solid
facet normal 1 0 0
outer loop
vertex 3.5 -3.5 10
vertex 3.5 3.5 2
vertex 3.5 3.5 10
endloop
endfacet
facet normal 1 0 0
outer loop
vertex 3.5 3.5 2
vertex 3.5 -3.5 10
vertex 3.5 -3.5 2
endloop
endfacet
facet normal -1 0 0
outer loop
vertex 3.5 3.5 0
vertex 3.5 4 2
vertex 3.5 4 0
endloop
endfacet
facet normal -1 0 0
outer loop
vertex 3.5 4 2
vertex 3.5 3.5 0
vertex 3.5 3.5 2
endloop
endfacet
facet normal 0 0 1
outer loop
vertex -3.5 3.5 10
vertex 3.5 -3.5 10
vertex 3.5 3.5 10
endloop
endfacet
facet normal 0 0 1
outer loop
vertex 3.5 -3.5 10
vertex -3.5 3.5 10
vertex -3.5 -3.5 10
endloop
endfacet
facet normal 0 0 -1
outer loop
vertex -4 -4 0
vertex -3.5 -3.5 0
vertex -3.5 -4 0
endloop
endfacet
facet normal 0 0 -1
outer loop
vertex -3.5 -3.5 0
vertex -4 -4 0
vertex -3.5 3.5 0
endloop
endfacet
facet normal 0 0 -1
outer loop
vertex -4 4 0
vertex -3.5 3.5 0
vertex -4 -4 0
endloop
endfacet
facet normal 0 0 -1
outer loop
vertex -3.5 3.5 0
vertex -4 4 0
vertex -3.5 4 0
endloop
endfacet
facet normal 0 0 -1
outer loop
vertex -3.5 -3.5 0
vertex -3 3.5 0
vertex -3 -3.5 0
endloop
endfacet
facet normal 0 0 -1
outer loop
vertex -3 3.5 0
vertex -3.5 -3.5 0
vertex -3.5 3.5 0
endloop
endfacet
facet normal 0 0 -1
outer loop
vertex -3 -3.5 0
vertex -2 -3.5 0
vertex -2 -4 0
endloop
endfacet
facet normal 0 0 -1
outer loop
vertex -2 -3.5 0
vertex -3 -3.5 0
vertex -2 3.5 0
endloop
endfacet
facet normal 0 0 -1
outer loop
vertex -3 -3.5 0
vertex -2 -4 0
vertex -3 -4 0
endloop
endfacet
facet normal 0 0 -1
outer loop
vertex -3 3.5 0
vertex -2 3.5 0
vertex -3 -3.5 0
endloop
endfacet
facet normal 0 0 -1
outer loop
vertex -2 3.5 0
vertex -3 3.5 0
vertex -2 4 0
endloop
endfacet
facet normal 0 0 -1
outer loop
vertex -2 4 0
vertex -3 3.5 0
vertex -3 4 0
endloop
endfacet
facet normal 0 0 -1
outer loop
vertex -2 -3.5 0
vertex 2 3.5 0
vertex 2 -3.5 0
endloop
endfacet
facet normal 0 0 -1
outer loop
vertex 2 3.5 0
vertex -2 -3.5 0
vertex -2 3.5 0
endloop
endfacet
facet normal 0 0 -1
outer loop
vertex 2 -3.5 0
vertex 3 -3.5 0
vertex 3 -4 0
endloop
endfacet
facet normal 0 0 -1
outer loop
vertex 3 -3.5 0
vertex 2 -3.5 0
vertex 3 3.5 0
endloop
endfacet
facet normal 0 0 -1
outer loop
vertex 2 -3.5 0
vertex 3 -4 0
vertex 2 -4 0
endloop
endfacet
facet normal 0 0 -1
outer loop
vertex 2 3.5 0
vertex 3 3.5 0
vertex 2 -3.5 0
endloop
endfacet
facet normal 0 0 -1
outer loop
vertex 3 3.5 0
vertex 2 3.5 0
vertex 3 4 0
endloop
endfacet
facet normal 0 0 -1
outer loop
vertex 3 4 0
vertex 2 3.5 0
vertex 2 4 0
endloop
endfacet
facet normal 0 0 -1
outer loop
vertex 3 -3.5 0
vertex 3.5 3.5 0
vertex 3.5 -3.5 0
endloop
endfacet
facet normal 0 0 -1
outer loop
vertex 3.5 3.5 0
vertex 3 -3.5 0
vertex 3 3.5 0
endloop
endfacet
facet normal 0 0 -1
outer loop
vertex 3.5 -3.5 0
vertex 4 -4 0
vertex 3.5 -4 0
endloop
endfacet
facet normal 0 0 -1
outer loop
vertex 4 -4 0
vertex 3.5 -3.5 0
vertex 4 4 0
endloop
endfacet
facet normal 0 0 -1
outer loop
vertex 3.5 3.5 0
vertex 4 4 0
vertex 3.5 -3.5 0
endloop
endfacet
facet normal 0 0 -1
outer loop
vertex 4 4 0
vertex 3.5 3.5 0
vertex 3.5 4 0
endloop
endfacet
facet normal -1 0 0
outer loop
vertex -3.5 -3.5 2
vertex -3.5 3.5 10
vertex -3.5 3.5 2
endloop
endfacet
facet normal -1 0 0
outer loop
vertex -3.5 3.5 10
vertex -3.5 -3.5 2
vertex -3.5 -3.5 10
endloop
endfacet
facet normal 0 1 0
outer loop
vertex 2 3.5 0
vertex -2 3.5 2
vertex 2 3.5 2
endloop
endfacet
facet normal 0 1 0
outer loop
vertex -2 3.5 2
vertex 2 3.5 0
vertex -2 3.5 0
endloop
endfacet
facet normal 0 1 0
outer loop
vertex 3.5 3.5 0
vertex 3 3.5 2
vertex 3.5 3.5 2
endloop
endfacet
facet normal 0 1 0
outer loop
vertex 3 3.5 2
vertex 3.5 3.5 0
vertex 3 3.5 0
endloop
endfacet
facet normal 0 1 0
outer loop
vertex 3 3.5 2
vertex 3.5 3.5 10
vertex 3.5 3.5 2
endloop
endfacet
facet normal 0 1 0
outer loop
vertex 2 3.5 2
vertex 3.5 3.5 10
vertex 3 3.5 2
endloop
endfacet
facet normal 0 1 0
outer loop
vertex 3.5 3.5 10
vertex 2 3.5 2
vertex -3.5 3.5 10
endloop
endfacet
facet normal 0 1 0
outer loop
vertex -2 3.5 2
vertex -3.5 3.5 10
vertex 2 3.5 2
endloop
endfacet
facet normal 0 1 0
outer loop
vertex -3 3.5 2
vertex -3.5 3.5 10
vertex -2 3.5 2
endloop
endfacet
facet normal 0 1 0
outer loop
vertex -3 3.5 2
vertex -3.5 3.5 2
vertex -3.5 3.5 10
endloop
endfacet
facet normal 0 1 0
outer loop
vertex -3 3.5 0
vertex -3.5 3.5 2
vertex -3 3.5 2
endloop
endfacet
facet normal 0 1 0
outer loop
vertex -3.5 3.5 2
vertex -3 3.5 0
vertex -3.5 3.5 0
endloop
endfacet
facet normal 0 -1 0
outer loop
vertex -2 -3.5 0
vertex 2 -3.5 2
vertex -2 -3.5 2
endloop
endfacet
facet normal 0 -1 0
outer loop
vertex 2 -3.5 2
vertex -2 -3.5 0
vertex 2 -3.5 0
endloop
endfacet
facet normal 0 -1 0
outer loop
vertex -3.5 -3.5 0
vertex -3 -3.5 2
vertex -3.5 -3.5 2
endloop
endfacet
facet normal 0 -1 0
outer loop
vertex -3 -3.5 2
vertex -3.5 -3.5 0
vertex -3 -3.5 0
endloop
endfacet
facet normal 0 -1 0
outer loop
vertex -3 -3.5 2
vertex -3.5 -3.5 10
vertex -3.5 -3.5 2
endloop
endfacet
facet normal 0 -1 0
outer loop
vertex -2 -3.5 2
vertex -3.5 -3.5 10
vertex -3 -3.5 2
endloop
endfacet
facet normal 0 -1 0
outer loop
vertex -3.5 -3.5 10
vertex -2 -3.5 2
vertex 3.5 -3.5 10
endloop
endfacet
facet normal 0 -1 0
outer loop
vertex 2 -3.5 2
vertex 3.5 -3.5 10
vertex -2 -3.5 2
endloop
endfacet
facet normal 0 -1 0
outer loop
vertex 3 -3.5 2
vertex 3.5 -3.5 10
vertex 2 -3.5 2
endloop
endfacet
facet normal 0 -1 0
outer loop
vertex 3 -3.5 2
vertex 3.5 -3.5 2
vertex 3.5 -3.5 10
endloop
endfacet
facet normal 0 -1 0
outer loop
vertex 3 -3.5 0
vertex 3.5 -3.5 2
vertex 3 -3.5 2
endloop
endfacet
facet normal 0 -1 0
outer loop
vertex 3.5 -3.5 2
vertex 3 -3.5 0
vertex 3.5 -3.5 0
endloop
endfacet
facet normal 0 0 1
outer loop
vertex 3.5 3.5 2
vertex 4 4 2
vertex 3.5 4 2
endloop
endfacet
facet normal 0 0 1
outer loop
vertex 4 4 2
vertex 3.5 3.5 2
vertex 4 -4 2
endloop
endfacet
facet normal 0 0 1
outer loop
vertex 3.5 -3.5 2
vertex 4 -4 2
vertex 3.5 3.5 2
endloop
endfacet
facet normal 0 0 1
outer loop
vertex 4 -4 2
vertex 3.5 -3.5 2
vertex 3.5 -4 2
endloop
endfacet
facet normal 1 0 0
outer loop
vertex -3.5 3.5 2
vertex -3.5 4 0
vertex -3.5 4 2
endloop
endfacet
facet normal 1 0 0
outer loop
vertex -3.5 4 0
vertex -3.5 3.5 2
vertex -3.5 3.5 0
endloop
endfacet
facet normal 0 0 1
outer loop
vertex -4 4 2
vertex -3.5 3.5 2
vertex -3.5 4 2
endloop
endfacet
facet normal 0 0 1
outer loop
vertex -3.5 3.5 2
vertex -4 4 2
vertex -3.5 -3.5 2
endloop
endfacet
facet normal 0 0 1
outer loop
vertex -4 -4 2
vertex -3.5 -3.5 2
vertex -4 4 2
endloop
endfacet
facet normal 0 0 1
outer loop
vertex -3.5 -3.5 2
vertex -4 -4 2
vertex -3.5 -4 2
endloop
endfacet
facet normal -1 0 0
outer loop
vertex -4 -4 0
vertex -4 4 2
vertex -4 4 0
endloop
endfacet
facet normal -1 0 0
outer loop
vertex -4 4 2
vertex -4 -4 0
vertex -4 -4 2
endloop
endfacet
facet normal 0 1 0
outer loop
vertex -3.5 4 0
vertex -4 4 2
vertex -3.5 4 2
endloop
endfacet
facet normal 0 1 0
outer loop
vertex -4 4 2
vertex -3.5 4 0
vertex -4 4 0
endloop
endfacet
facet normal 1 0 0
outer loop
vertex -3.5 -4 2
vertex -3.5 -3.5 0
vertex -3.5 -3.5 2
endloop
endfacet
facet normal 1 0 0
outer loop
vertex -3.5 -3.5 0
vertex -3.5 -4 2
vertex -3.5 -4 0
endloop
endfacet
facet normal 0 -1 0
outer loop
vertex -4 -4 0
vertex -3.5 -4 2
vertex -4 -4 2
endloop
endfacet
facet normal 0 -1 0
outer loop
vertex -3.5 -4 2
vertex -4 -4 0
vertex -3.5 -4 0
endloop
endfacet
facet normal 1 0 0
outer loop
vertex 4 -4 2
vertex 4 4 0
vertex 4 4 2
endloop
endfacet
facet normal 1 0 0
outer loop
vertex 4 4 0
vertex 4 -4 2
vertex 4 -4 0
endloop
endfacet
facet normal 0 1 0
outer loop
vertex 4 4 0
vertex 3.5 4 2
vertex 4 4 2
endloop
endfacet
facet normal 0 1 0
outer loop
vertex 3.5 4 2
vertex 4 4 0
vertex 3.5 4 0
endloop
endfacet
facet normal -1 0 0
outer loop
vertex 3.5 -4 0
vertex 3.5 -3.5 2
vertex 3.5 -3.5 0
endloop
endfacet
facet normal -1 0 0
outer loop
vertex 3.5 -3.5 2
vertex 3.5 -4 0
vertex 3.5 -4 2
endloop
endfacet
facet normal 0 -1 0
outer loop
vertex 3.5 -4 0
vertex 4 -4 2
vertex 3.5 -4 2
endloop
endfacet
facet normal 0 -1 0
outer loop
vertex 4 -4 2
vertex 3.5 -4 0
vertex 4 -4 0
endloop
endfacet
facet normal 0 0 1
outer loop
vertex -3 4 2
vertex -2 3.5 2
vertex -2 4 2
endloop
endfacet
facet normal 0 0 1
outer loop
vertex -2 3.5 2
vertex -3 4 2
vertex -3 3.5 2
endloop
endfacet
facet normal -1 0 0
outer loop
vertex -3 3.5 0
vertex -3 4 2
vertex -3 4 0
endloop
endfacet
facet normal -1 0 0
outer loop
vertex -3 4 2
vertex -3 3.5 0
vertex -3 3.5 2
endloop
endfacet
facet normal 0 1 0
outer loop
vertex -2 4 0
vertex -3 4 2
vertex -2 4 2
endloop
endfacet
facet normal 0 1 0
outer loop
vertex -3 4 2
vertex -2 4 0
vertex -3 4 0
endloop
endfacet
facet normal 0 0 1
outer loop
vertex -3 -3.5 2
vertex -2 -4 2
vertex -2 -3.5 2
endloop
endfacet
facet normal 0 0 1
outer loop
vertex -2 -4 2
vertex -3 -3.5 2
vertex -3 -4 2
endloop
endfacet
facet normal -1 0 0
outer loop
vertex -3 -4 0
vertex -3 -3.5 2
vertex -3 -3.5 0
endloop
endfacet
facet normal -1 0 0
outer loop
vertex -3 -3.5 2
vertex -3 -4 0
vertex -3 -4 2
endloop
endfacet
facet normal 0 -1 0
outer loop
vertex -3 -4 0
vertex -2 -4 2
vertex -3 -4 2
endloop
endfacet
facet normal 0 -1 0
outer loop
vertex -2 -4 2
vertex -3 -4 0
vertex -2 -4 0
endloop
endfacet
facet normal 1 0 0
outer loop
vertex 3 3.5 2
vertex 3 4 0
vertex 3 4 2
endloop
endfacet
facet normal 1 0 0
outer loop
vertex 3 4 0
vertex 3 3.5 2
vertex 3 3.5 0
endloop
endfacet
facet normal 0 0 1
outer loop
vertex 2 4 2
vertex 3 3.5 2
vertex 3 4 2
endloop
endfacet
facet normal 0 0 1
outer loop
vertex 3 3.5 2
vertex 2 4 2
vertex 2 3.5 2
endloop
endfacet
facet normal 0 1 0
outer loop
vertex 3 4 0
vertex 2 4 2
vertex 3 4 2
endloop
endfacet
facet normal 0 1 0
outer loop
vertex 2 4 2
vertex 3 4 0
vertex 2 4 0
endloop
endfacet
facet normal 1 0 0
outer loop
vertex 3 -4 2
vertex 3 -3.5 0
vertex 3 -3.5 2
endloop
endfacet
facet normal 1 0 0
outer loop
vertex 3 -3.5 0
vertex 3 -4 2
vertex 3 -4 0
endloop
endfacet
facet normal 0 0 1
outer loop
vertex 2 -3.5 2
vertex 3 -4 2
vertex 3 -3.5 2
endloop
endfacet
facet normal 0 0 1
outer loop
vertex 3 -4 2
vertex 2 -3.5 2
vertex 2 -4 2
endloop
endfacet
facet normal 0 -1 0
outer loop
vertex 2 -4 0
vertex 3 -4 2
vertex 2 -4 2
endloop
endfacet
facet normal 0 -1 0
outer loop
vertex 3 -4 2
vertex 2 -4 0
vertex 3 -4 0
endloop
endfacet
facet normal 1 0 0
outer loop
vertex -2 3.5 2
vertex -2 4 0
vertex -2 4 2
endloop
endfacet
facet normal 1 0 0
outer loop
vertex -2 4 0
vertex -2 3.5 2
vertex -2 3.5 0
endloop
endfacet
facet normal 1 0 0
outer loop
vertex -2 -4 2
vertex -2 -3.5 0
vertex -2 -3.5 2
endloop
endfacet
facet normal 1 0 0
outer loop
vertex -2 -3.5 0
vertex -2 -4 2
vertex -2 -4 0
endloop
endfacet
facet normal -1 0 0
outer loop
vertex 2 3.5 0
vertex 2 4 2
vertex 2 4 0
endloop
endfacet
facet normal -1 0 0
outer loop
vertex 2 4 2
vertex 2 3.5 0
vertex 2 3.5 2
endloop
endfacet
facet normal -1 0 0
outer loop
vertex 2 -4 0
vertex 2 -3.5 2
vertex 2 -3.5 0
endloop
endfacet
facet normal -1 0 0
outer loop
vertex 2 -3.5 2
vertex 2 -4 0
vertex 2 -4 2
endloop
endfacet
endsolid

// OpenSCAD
translate([0, 0, 5]) color([0,1,0,0.9]) cube([7, 7, 10], center=true);
translate([-3.25, 3.25, 1]) color([1,0,0]) cube([0.5, 0.5, 2], center=true);
translate([-3.25, 2.75, 1]) color([1,0,0]) cube([0.5, 0.5, 2], center=true);
translate([-3.25, 2.25, 1]) color([1,0,0]) cube([0.5, 0.5, 2], center=true);
translate([-3.25, 1.75, 1]) color([1,0,0]) cube([0.5, 0.5, 2], center=true);
translate([-3.25, 1.25, 1]) color([1,0,0]) cube([0.5, 0.5, 2], center=true);
translate([-3.25, 0.75, 1]) color([1,0,0]) cube([0.5, 0.5, 2], center=true);
translate([-3.25, 0.25, 1]) color([1,0,0]) cube([0.5, 0.5, 2], center=true);
translate([-3.25, -0.25, 1]) color([1,0,0]) cube([0.5, 0.5, 2], center=true);
translate([-3.25, -0.75, 1]) color([1,0,0]) cube([0.5, 0.5, 2], center=true);
translate([-3.25, -1.25, 1]) color([1,0,0]) cube([0.5, 0.5, 2], center=true);
translate([-3.25, -1.75, 1]) color([1,0,0]) cube([0.5, 0.5, 2], center=true);
translate([-3.25, -2.25, 1]) color([1,0,0]) cube([0.5, 0.5, 2], center=true);
translate([-3.25, -2.75, 1]) color([1,0,0]) cube([0.5, 0.5, 2], center=true);
translate([-3.25, -3.25, 1]) color([1,0,0]) cube([0.5, 0.5, 2], center=true);
translate([3.25, 3.25, 1]) color([1,0,0]) cube([0.5, 0.5, 2], center=true);
translate([3.25, 2.75, 1]) color([1,0,0]) cube([0.5, 0.5, 2], center=true);
translate([3.25, 2.25, 1]) color([1,0,0]) cube([0.5, 0.5, 2], center=true);
translate([3.25, 1.75, 1]) color([1,0,0]) cube([0.5, 0.5, 2], center=true);
translate([3.25, 1.25, 1]) color([1,0,0]) cube([0.5, 0.5, 2], center=true);
translate([3.25, 0.75, 1]) color([1,0,0]) cube([0.5, 0.5, 2], center=true);
translate([3.25, 0.25, 1]) color([1,0,0]) cube([0.5, 0.5, 2], center=true);
translate([3.25, -0.25, 1]) color([1,0,0]) cube([0.5, 0.5, 2], center=true);
translate([3.25, -0.75, 1]) color([1,0,0]) cube([0.5, 0.5, 2], center=true);
translate([3.25, -1.25, 1]) color([1,0,0]) cube([0.5, 0.5, 2], center=true);
translate([3.25, -1.75, 1]) color([1,0,0]) cube([0.5, 0.5, 2], center=true);
translate([3.25, -2.25, 1]) color([1,0,0]) cube([0.5, 0.5, 2], center=true);
translate([3.25, -2.75, 1]) color([1,0,0]) cube([0.5, 0.5, 2], center=true);
translate([3.25, -3.25, 1]) color([1,0,0]) cube([0.5, 0.5, 2], center=true);
translate([-3.75, 3.75, 1]) color([1,0,0]) cube([0.5, 0.5, 2], center=true);
translate([-3.75, 3.25, 1]) color([1,0,0]) cube([0.5, 0.5, 2], center=true);
translate([-3.75, 2.75, 1]) color([1,0,0]) cube([0.5, 0.5, 2], center=true);
translate([-3.75, 2.25, 1]) color([1,0,0]) cube([0.5, 0.5, 2], center=true);
translate([-3.75, 1.75, 1]) color([1,0,0]) cube([0.5, 0.5, 2], center=true);
translate([-3.75, 1.25, 1]) color([1,0,0]) cube([0.5, 0.5, 2], center=true);
translate([-3.75, 0.75, 1]) color([1,0,0]) cube([0.5, 0.5, 2], center=true);
translate([-3.75, 0.25, 1]) color([1,0,0]) cube([0.5, 0.5, 2], center=true);
translate([-3.75, -0.25, 1]) color([1,0,0]) cube([0.5, 0.5, 2], center=true);
translate([-3.75, -0.75, 1]) color([1,0,0]) cube([0.5, 0.5, 2], center=true);
translate([-3.75, -1.25, 1]) color([1,0,0]) cube([0.5, 0.5, 2], center=true);
translate([-3.75, -1.75, 1]) color([1,0,0]) cube([0.5, 0.5, 2], center=true);
translate([-3.75, -2.25, 1]) color([1,0,0]) cube([0.5, 0.5, 2], center=true);
translate([-3.75, -2.75, 1]) color([1,0,0]) cube([0.5, 0.5, 2], center=true);
translate([-3.75, -3.25, 1]) color([1,0,0]) cube([0.5, 0.5, 2], center=true);
translate([-3.75, -3.75, 1]) color([1,0,0]) cube([0.5, 0.5, 2], center=true);
translate([3.75, 3.75, 1]) color([1,0,0]) cube([0.5, 0.5, 2], center=true);
translate([3.75, 3.25, 1]) color([1,0,0]) cube([0.5, 0.5, 2], center=true);
translate([3.75, 2.75, 1]) color([1,0,0]) cube([0.5, 0.5, 2], center=true);
translate([3.75, 2.25, 1]) color([1,0,0]) cube([0.5, 0.5, 2], center=true);
translate([3.75, 1.75, 1]) color([1,0,0]) cube([0.5, 0.5, 2], center=true);
translate([3.75, 1.25, 1]) color([1,0,0]) cube([0.5, 0.5, 2], center=true);
translate([3.75, 0.75, 1]) color([1,0,0]) cube([0.5, 0.5, 2], center=true);
translate([3.75, 0.25, 1]) color([1,0,0]) cube([0.5, 0.5, 2], center=true);
translate([3.75, -0.25, 1]) color([1,0,0]) cube([0.5, 0.5, 2], center=true);
translate([3.75, -0.75, 1]) color([1,0,0]) cube([0.5, 0.5, 2], center=true);
translate([3.75, -1.25, 1]) color([1,0,0]) cube([0.5, 0.5, 2], center=true);
translate([3.75, -1.75, 1]) color([1,0,0]) cube([0.5, 0.5, 2], center=true);
translate([3.75, -2.25, 1]) color([1,0,0]) cube([0.5, 0.5, 2], center=true);
translate([3.75, -2.75, 1]) color([1,0,0]) cube([0.5, 0.5, 2], center=true);
translate([3.75, -3.25, 1]) color([1,0,0]) cube([0.5, 0.5, 2], center=true);
translate([3.75, -3.75, 1]) color([1,0,0]) cube([0.5, 0.5, 2], center=true);
translate([-2.75, 3.75, 1]) color([1,0,0]) cube([0.5, 0.5, 2], center=true);
translate([-2.75, 3.25, 1]) color([1,0,0]) cube([0.5, 0.5, 2], center=true);
translate([-2.75, 2.75, 1]) color([1,0,0]) cube([0.5, 0.5, 2], center=true);
translate([-2.75, 2.25, 1]) color([1,0,0]) cube([0.5, 0.5, 2], center=true);
translate([-2.75, 1.75, 1]) color([1,0,0]) cube([0.5, 0.5, 2], center=true);
translate([-2.75, 1.25, 1]) color([1,0,0]) cube([0.5, 0.5, 2], center=true);
translate([-2.75, 0.75, 1]) color([1,0,0]) cube([0.5, 0.5, 2], center=true);
translate([-2.75, 0.25, 1]) color([1,0,0]) cube([0.5, 0.5, 2], center=true);
translate([-2.75, -0.25, 1]) color([1,0,0]) cube([0.5, 0.5, 2], center=true);
translate([-2.75, -0.75, 1]) color([1,0,0]) cube([0.5, 0.5, 2], center=true);
translate([-2.75, -1.25, 1]) color([1,0,0]) cube([0.5, 0.5, 2], center=true);
translate([-2.75, -1.75, 1]) color([1,0,0]) cube([0.5, 0.5, 2], center=true);
translate([-2.75, -2.25, 1]) color([1,0,0]) cube([0.5, 0.5, 2], center=true);
translate([-2.75, -2.75, 1]) color([1,0,0]) cube([0.5, 0.5, 2], center=true);
translate([-2.75, -3.25, 1]) color([1,0,0]) cube([0.5, 0.5, 2], center=true);
translate([-2.75, -3.75, 1]) color([1,0,0]) cube([0.5, 0.5, 2], center=true);
translate([2.75, 3.75, 1]) color([1,0,0]) cube([0.5, 0.5, 2], center=true);
translate([2.75, 3.25, 1]) color([1,0,0]) cube([0.5, 0.5, 2], center=true);
translate([2.75, 2.75, 1]) color([1,0,0]) cube([0.5, 0.5, 2], center=true);
translate([2.75, 2.25, 1]) color([1,0,0]) cube([0.5, 0.5, 2], center=true);
translate([2.75, 1.75, 1]) color([1,0,0]) cube([0.5, 0.5, 2], center=true);
translate([2.75, 1.25, 1]) color([1,0,0]) cube([0.5, 0.5, 2], center=true);
translate([2.75, 0.75, 1]) color([1,0,0]) cube([0.5, 0.5, 2], center=true);
translate([2.75, 0.25, 1]) color([1,0,0]) cube([0.5, 0.5, 2], center=true);
translate([2.75, -0.25, 1]) color([1,0,0]) cube([0.5, 0.5, 2], center=true);
translate([2.75, -0.75, 1]) color([1,0,0]) cube([0.5, 0.5, 2], center=true);
translate([2.75, -1.25, 1]) color([1,0,0]) cube([0.5, 0.5, 2], center=true);
translate([2.75, -1.75, 1]) color([1,0,0]) cube([0.5, 0.5, 2], center=true);
translate([2.75, -2.25, 1]) color([1,0,0]) cube([0.5, 0.5, 2], center=true);
translate([2.75, -2.75, 1]) color([1,0,0]) cube([0.5, 0.5, 2], center=true);
translate([2.75, -3.25, 1]) color([1,0,0]) cube([0.5, 0.5, 2], center=true);
translate([2.75, -3.75, 1]) color([1,0,0]) cube([0.5, 0.5, 2], center=true);
translate([-2.25, 3.75, 1]) color([1,0,0]) cube([0.5, 0.5, 2], center=true);
translate([-2.25, 3.25, 1]) color([1,0,0]) cube([0.5, 0.5, 2], center=true);
translate([-2.25, 2.75, 1]) color([1,0,0]) cube([0.5, 0.5, 2], center=true);
translate([-2.25, 2.25, 1]) color([1,0,0]) cube([0.5, 0.5, 2], center=true);
translate([-2.25, 1.75, 1]) color([1,0,0]) cube([0.5, 0.5, 2], center=true);
translate([-2.25, 1.25, 1]) color([1,0,0]) cube([0.5, 0.5, 2], center=true);
translate([-2.25, 0.75, 1]) color([1,0,0]) cube([0.5, 0.5, 2], center=true);
translate([-2.25, 0.25, 1]) color([1,0,0]) cube([0.5, 0.5, 2], center=true);
translate([-2.25, -0.25, 1]) color([1,0,0]) cube([0.5, 0.5, 2], center=true);
translate([-2.25, -0.75, 1]) color([1,0,0]) cube([0.5, 0.5, 2], center=true);
translate([-2.25, -1.25, 1]) color([1,0,0]) cube([0.5, 0.5, 2], center=true);
translate([-2.25, -1.75, 1]) color([1,0,0]) cube([0.5, 0.5, 2], center=true);
translate([-2.25, -2.25, 1]) color([1,0,0]) cube([0.5, 0.5, 2], center=true);
translate([-2.25, -2.75, 1]) color([1,0,0]) cube([0.5, 0.5, 2], center=true);
translate([-2.25, -3.25, 1]) color([1,0,0]) cube([0.5, 0.5, 2], center=true);
translate([-2.25, -3.75, 1]) color([1,0,0]) cube([0.5, 0.5, 2], center=true);
translate([2.25, 3.75, 1]) color([1,0,0]) cube([0.5, 0.5, 2], center=true);
translate([2.25, 3.25, 1]) color([1,0,0]) cube([0.5, 0.5, 2], center=true);
translate([2.25, 2.75, 1]) color([1,0,0]) cube([0.5, 0.5, 2], center=true);
translate([2.25, 2.25, 1]) color([1,0,0]) cube([0.5, 0.5, 2], center=true);
translate([2.25, 1.75, 1]) color([1,0,0]) cube([0.5, 0.5, 2], center=true);
translate([2.25, 1.25, 1]) color([1,0,0]) cube([0.5, 0.5, 2], center=true);
translate([2.25, 0.75, 1]) color([1,0,0]) cube([0.5, 0.5, 2], center=true);
translate([2.25, 0.25, 1]) color([1,0,0]) cube([0.5, 0.5, 2], center=true);
translate([2.25, -0.25, 1]) color([1,0,0]) cube([0.5, 0.5, 2], center=true);
translate([2.25, -0.75, 1]) color([1,0,0]) cube([0.5, 0.5, 2], center=true);
translate([2.25, -1.25, 1]) color([1,0,0]) cube([0.5, 0.5, 2], center=true);
translate([2.25, -1.75, 1]) color([1,0,0]) cube([0.5, 0.5, 2], center=true);
translate([2.25, -2.25, 1]) color([1,0,0]) cube([0.5, 0.5, 2], center=true);
translate([2.25, -2.75, 1]) color([1,0,0]) cube([0.5, 0.5, 2], center=true);
translate([2.25, -3.25, 1]) color([1,0,0]) cube([0.5, 0.5, 2], center=true);
translate([2.25, -3.75, 1]) color([1,0,0]) cube([0.5, 0.5, 2], center=true);
